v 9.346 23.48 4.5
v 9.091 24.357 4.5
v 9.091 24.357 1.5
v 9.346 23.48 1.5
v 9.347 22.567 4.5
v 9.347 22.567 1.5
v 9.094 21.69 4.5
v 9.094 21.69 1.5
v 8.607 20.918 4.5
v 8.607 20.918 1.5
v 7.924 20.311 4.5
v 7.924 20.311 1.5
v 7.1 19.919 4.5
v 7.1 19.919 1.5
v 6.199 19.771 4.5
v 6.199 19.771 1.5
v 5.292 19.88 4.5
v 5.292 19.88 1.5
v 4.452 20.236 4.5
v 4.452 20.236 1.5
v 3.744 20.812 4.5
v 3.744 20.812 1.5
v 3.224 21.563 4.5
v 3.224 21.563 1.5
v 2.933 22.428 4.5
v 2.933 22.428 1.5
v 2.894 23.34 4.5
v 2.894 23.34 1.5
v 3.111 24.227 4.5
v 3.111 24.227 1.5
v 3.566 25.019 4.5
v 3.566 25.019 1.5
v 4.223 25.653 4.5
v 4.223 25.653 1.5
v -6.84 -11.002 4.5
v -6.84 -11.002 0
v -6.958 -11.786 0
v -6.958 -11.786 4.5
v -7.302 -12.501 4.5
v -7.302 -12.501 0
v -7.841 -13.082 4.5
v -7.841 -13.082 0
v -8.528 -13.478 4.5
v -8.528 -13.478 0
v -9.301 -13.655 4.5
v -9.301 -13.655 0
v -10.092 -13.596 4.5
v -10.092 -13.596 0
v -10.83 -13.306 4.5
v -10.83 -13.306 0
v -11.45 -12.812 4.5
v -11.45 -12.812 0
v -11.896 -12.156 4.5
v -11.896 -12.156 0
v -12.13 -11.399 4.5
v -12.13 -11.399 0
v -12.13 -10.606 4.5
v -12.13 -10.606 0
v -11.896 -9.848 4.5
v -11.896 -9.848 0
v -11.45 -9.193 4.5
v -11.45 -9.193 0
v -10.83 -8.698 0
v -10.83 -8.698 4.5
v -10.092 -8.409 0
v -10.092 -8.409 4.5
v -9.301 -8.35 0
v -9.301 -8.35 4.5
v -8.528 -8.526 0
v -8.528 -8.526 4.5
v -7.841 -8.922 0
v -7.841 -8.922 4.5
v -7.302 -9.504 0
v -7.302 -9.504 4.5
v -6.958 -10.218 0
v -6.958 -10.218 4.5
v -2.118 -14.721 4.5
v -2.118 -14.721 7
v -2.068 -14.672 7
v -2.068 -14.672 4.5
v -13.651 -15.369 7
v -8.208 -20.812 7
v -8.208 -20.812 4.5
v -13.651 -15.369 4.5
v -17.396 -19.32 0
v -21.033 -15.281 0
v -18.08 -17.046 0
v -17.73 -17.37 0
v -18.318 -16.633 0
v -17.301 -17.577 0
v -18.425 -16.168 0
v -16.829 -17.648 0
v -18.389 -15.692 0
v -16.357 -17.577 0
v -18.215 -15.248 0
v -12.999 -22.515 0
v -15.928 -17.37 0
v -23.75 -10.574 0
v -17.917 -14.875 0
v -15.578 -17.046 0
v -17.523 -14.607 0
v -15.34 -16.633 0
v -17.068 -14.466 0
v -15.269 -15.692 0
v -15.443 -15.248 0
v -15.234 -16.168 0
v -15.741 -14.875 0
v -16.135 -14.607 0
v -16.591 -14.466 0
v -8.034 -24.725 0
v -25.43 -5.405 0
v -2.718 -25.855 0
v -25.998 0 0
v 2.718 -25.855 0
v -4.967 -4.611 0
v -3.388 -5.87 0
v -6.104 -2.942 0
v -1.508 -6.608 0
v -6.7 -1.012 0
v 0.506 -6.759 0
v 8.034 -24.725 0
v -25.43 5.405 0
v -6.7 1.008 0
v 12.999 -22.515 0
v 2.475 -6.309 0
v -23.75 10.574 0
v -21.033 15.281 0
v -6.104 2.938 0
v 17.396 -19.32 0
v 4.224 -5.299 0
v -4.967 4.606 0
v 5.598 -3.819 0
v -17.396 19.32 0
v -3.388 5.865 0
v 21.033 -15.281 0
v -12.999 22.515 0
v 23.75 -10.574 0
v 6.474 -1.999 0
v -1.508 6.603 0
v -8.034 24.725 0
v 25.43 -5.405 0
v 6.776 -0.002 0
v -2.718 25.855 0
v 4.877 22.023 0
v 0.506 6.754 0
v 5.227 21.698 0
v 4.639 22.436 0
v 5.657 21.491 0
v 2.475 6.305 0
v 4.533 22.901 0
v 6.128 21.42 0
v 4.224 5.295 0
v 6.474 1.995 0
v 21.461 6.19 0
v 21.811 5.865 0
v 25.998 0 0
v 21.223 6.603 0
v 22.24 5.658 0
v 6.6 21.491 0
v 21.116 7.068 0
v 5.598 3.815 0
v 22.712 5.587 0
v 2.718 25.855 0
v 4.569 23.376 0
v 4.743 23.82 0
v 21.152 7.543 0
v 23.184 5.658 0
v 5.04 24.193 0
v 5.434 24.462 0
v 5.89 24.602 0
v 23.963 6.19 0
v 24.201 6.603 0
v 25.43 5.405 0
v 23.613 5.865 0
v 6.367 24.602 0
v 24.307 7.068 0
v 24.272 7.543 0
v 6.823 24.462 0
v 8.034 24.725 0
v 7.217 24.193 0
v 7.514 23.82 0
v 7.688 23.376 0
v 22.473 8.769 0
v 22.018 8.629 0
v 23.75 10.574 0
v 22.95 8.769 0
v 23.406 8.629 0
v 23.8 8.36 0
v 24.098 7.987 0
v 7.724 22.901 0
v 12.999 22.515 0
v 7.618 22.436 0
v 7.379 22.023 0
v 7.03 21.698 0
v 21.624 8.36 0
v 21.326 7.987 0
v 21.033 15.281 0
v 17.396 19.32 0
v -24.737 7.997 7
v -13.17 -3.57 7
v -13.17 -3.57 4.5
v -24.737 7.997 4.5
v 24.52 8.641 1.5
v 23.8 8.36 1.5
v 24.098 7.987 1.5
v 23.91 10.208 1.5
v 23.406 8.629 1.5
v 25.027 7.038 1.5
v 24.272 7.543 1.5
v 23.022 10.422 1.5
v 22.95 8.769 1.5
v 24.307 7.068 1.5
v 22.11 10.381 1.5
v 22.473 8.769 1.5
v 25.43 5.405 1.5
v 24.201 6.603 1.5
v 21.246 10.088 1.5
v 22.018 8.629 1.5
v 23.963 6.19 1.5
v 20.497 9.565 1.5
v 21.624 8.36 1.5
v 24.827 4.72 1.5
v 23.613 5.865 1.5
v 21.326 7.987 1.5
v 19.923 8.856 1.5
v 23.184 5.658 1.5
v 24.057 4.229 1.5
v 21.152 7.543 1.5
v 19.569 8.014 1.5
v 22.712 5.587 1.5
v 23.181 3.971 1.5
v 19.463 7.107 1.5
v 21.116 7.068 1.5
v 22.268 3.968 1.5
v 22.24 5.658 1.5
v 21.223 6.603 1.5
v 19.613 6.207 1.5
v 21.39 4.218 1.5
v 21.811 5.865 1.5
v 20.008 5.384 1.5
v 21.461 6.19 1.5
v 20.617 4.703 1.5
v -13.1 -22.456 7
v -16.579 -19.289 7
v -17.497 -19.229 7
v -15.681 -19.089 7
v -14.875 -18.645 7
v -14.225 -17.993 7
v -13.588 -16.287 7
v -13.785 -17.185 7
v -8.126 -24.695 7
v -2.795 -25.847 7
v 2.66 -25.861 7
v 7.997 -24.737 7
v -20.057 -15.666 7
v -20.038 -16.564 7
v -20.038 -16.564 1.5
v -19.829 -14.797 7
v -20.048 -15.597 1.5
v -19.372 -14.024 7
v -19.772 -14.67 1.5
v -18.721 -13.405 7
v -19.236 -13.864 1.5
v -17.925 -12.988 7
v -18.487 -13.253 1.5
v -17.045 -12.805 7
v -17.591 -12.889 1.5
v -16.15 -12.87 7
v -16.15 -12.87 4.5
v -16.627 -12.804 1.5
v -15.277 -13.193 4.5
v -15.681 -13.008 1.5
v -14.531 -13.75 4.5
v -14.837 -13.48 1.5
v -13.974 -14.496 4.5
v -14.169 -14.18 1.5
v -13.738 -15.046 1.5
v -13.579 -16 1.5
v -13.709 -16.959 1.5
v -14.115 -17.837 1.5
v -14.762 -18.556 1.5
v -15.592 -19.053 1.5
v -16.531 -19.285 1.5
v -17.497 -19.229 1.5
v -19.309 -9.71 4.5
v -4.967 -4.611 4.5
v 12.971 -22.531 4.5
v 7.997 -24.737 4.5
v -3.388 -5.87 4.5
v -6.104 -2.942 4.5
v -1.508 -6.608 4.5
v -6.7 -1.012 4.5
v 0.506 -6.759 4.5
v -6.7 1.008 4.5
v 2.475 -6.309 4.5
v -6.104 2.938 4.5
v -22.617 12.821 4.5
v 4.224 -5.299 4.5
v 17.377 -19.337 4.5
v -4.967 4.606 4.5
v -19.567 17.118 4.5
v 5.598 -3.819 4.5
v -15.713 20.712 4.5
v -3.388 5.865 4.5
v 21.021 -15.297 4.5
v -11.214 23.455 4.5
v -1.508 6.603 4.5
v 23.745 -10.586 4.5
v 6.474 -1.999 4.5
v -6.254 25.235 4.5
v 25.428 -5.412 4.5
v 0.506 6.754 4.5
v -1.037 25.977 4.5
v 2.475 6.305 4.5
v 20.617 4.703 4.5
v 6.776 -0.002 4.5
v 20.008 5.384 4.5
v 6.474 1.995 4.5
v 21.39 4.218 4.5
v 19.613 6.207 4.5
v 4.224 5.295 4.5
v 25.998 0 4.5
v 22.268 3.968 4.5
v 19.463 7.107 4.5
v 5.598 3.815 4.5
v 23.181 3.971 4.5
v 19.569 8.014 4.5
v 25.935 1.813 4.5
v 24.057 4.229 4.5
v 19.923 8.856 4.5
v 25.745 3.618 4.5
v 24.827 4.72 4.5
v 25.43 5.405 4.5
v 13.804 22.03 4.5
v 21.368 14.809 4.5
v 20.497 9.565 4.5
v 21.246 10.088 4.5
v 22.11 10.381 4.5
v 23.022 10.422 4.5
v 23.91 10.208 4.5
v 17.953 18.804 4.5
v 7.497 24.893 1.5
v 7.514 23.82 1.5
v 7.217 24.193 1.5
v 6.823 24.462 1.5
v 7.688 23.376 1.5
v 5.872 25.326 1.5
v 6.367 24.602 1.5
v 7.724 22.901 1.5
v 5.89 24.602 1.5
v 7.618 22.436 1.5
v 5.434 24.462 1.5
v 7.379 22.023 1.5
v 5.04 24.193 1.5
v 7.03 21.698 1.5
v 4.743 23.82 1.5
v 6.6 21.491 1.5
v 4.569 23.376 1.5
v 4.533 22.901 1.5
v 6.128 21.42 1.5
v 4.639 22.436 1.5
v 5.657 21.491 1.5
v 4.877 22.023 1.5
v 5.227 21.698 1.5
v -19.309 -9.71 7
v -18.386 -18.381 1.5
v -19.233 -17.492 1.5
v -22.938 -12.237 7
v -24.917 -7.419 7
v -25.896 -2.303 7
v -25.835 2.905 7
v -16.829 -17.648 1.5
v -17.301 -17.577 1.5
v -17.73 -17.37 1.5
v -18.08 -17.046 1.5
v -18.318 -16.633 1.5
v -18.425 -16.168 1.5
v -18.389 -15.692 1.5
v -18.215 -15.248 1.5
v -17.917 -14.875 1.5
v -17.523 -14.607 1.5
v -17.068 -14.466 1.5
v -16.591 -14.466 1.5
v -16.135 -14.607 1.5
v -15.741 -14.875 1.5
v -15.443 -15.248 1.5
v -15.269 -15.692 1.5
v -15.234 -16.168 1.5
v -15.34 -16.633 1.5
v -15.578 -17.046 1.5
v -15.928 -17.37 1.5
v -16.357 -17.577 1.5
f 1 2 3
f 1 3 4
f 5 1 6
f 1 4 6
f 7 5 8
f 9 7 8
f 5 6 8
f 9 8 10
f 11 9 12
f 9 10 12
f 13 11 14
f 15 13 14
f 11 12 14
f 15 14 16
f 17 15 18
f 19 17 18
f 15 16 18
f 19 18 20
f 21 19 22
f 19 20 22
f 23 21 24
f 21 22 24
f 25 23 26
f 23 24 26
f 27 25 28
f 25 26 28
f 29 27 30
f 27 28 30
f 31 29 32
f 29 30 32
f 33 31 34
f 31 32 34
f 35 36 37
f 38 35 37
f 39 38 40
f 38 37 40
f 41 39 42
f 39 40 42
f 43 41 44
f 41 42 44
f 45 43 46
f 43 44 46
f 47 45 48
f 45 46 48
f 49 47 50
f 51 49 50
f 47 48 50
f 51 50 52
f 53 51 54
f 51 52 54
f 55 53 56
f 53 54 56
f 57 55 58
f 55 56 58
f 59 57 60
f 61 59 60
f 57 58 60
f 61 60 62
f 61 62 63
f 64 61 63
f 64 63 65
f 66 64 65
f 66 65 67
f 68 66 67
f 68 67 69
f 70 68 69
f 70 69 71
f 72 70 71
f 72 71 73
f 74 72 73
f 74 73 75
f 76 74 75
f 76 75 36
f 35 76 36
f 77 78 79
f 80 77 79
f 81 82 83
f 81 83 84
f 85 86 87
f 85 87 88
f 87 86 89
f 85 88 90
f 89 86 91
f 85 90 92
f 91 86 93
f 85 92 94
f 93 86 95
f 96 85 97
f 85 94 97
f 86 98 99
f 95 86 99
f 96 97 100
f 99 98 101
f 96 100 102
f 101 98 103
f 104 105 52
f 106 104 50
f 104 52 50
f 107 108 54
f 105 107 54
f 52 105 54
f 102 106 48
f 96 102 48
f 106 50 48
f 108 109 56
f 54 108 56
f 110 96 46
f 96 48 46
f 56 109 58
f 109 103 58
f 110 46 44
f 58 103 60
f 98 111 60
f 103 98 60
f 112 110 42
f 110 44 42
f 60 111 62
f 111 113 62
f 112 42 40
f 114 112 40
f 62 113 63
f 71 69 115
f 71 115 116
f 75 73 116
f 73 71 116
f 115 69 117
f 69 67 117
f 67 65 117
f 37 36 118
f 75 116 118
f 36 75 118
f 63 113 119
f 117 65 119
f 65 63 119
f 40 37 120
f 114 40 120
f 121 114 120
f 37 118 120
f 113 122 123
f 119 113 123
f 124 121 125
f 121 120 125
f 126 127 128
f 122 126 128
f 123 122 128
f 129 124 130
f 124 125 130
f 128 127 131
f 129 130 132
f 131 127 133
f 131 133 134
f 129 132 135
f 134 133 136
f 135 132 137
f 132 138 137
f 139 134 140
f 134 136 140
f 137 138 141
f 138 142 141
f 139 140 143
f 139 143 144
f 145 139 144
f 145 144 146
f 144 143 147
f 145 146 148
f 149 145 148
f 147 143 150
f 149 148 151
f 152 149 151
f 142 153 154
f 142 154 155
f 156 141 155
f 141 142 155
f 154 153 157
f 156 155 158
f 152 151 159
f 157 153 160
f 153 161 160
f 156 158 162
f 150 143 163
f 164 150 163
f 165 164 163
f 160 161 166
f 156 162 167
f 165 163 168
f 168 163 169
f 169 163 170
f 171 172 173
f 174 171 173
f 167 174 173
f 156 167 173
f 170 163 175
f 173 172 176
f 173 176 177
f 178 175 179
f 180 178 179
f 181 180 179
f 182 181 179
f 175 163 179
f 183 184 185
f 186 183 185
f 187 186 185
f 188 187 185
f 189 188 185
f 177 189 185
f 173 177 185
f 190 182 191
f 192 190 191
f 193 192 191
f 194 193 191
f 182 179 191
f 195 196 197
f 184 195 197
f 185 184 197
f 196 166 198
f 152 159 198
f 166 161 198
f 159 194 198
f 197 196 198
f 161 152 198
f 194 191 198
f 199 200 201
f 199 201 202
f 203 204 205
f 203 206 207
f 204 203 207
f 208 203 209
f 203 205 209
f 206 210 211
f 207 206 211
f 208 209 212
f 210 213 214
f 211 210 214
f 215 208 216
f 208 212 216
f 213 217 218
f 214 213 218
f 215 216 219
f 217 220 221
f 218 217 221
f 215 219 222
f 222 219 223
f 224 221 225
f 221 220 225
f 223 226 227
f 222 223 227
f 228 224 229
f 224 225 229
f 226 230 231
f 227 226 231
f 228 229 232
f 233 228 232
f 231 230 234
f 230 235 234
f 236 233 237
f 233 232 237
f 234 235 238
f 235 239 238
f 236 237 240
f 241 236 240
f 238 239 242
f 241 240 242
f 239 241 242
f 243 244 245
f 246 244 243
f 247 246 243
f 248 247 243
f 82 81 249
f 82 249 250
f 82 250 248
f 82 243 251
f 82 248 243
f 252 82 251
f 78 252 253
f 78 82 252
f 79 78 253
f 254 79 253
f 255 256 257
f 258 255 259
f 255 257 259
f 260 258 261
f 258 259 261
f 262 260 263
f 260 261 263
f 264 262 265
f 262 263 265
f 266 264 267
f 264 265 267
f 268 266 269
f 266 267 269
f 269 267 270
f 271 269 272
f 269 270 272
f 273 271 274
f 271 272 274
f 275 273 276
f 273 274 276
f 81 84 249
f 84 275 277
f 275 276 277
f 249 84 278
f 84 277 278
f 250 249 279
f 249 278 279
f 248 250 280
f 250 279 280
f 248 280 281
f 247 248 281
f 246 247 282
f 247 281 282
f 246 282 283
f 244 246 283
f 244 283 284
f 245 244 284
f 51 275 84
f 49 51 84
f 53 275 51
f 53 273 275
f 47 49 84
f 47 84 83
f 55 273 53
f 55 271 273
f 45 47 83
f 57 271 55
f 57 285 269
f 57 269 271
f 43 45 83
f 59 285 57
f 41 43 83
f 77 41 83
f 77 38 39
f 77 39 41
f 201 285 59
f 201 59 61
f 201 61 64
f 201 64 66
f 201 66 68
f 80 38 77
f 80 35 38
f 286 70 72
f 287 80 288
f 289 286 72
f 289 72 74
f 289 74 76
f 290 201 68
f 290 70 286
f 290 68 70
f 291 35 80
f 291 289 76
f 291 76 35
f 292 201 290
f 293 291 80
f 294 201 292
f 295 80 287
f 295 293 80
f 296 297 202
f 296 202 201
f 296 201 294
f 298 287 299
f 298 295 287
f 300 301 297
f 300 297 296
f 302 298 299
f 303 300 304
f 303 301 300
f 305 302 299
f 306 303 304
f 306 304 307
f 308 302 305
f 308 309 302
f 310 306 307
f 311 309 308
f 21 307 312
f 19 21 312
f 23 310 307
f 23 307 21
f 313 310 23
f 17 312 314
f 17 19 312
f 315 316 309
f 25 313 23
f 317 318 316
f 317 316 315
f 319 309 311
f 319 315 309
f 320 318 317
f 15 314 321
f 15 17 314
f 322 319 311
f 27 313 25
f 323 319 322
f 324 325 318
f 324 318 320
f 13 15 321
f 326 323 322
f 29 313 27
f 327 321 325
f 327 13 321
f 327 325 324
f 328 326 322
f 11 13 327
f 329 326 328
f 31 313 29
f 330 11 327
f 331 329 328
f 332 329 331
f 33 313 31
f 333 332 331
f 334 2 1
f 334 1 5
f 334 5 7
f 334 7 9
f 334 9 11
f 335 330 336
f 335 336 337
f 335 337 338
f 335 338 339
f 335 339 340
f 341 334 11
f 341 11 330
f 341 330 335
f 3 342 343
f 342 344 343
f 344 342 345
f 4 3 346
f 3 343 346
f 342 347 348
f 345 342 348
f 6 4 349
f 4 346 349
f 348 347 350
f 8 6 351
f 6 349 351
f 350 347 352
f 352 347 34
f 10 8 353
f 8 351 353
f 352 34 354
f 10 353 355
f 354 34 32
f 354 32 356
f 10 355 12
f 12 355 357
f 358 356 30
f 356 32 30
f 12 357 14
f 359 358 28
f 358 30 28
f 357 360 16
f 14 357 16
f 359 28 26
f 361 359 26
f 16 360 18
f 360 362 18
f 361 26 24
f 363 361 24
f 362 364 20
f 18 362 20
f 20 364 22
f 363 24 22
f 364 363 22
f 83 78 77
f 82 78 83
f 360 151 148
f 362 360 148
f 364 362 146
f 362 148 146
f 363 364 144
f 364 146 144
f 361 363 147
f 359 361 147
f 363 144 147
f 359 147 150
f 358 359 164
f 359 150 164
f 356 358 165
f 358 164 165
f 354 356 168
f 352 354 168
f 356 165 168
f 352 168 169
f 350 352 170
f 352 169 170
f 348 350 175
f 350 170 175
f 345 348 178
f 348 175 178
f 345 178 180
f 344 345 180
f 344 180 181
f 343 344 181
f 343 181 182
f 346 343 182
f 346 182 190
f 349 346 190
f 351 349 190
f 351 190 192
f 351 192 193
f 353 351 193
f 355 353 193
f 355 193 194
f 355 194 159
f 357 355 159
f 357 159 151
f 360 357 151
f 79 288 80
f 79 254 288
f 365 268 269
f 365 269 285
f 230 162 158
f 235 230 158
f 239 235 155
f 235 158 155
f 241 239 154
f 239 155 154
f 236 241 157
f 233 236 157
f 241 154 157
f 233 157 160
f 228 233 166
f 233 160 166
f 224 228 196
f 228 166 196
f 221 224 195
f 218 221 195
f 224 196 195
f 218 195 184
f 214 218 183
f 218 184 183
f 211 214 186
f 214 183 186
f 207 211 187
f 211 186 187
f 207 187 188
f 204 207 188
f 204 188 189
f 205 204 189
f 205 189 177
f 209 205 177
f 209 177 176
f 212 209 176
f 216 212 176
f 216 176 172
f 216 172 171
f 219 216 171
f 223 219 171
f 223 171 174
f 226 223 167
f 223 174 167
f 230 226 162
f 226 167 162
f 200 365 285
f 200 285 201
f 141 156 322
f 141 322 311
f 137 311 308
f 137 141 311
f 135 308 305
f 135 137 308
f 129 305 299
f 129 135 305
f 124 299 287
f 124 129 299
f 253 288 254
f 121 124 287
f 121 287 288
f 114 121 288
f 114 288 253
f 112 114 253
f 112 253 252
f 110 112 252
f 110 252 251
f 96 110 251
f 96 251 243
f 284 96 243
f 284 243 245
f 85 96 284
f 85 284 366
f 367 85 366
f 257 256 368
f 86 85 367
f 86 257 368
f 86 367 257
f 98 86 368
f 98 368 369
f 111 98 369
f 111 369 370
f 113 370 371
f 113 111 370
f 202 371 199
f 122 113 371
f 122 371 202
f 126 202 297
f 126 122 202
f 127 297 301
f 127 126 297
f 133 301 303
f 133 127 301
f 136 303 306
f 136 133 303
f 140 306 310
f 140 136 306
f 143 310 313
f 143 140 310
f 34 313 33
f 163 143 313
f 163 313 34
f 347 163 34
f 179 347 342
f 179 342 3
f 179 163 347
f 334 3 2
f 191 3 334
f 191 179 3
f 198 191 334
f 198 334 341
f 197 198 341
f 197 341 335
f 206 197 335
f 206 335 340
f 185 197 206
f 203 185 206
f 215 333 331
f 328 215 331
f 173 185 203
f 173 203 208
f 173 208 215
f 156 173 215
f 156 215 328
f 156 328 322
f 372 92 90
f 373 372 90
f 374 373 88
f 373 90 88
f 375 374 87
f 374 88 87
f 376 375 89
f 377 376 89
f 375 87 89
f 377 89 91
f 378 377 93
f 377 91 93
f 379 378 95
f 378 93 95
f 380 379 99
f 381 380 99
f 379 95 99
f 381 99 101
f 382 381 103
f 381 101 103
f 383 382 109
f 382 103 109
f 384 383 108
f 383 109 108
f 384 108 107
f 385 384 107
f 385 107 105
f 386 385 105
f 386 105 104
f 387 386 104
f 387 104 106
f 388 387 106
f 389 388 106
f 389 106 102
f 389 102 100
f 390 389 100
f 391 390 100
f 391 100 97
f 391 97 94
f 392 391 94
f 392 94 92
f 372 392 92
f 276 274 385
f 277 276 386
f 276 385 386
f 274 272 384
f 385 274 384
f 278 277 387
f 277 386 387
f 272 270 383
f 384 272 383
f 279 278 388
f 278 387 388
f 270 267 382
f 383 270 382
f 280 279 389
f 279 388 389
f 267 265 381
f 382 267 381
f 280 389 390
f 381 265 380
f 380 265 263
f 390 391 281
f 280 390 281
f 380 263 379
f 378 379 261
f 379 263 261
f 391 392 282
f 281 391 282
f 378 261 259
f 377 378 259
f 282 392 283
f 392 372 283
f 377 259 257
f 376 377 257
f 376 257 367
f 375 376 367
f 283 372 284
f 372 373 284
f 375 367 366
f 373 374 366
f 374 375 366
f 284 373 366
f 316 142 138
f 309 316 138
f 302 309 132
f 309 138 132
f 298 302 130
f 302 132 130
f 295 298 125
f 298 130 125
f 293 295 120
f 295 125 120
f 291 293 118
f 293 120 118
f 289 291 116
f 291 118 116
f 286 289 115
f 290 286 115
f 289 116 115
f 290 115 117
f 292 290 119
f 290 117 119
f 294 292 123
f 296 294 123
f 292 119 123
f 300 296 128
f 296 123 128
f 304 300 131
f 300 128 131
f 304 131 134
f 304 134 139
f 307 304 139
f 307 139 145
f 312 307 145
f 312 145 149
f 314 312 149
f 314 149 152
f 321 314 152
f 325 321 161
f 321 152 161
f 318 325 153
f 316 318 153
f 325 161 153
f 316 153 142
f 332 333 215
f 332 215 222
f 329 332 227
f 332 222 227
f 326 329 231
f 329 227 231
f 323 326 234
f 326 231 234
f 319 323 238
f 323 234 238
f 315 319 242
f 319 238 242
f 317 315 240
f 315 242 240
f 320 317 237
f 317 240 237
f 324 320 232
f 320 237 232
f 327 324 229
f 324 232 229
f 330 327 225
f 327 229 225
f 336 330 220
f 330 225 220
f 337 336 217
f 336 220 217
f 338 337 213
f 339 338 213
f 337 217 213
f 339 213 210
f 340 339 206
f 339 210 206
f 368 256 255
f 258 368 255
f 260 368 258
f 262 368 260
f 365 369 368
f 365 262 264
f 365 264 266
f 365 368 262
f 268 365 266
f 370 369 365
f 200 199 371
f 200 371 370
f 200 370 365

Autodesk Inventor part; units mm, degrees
ref_plane "YZ Plane" through (0, 0, 0) normal (1, 0, 0) x (0, 1, 0)
ref_plane "XZ Plane" through (0, 0, 0) normal (0, 1, 0) x (-1, 0, 0)
ref_plane "XY Plane" through (0, 0, 0) normal (0, 0, 1) x (1, 0, 0)
ref_plane "Work Plane1" through (0, 0, 0) normal (0, 0, 1) x (1, 0, 0)
sketch "Sketch1" plane through (0, 0, 0) normal (0, 0, 1) x (1, 0, 0)
  circle A0 centre (0, 0) radius 25.9979 projected
  circle A1 centre (-9.4998, -11.0022) radius 2.6601 projected
  circle A2 centre (0.0001, -0.0022) radius 3.8801 projected
  circle A3 centre (0.0001, -0.0022) radius 6.7754 projected
  point P0 (0, 0)
extrude "Extrusion1" add sketch "Sketch1" along normal blind 7 contours A0
sketch "Sketch2" plane through (0, 0, 7) normal (0, 0, 1) x (1, 0, 0)
  line L0 (-10.4551, 50.2837) -> (48.898, -9.0695)
  line L1 (48.898, -9.0695) -> (20.6137, -37.3537)
  line L2 (20.6137, -37.3537) -> (-38.7394, 21.9994)
  line L3 (-38.7394, 21.9994) -> (-10.4551, 50.2837)
  line L4 (-10.4551, 50.2837) -> (20.6137, -37.3537) construction
  line L5 (48.898, -9.0695) -> (-38.7394, 21.9994) construction
  line L6 (-10.4551, 50.2837) -> (73.4829, 50.2837) construction
  circle A0 centre (-9.4998, -11.0022) radius 2.6601 projected
  point P0 (5.0793, 6.465)
  dimension "d2" = 135
  dimension "d3" = 40
extrude "Extrusion2" cut sketch "Sketch2" against normal blind 2.5 contours L0 L1 L2 L3
sketch "Sketch3" plane through (0, 0, 7) normal (0, 0, 1) x (1, 0, 0)
  line L0 (-7.7936, -20.2561) -> (-2.9652, -15.4277) projected
  line L1 (-18.7537, -9.2959) -> (-13.9253, -4.4675) projected
  line L2 (-13.219, -3.6198) -> (-2.1175, -14.7214)
  line L3 (-2.1175, -14.7214) -> (-8.2078, -20.8117)
  line L4 (-8.2078, -20.8117) -> (-19.3094, -9.7102)
  line L5 (-19.3094, -9.7102) -> (-13.219, -3.6198)
  line L6 (-7.6188, -9.1212) -> (-24.7373, 7.9973) projected
  line L7 (-13.1696, -3.5704) -> (-2.1175, -14.7214)
  line L8 (-2.1175, -14.7214) -> (-0.0463, -12.6686)
  line L9 (-0.0463, -12.6686) -> (-11.0984, -1.5176)
  line L10 (-11.0984, -1.5176) -> (-13.1696, -3.5704)
  line L11 (-13.1696, -3.5704) -> (-13.219, -3.6198)
  line L12 (7.9973, -24.7373) -> (-24.7373, 7.9973) projected
  line L13 (-13.9253, -4.4675) -> (-2.9652, -15.4277) projected
  line L14 (-7.7936, -20.2561) -> (-18.7537, -9.2959) projected
  point P0 (0, 0)
  point P1 (-8.9176, -8.4066)
  point P2 (-24.7373, 7.9973)
  dimension "d6" = 0.1
extrude "Extrusion3" cut sketch "Sketch3" against normal up to surface (2.5 mm away) contours L14 L1 L13 L0 | L11 L7 L2 | L2 L3 L4 L5 | L7 L6 L12 L8 | L10 L9 L8 L12 L6
sketch "Skizze4" plane through (0, 0, 7) normal (0, 0, 1) x (1, 0, 0)
  spline S0 degree 2 poles (24.1427, 2.2394) (24.731, 1.8489) (25.3785, 0.5587) (25.3785, -0.3311) knots 0 0 0 1 2 2 2 construction
  spline S1 degree 2 poles (25.3785, -0.3311) (25.3785, -1.1665) (24.7013, -2.5111) (24.1328, -2.8867) knots 0 0 0 1 2 2 2 construction
  spline S2 degree 2 poles (24.1328, -2.8867) (23.6682, -3.1784) (22.7141, -3.3761) (21.9726, -3.3761) knots 0 0 0 1 2 2 2 construction
  line L0 (21.9726, -3.3761) -> (20.5687, -3.3761) construction
  line L1 (20.5687, -3.3761) -> (20.5687, 2.7239) construction
  line L2 (20.5687, 2.7239) -> (21.9578, 2.7239) construction
  spline S3 degree 2 poles (21.9578, 2.7239) (22.8179, 2.7239) (23.7967, 2.4668) (24.1427, 2.2394) knots 0 0 0 1 2 2 2 construction
  spline S4 degree 2 poles (19.1896, -2.9312) (18.8979, -3.1982) (18.1564, -3.4849) (17.5978, -3.4849) knots 0 0 0 1 2 2 2 construction
  spline S5 degree 2 poles (17.5978, -3.4849) (16.9354, -3.4849) (16.0061, -3.2081) (15.5958, -3.0103) knots 0 0 0 1 2 2 2 construction
  line L3 (15.5958, -3.0103) -> (15.5958, -1.992) construction
  line L4 (15.5958, -1.992) -> (15.6551, -1.992) construction
  spline S6 degree 2 poles (15.6551, -1.992) (16.0555, -2.3677) (17.0689, -2.7829) (17.5385, -2.7829) knots 0 0 0 1 2 2 2 construction
  spline S7 degree 2 poles (17.5385, -2.7829) (18.2108, -2.7829) (18.8979, -2.2243) (18.8979, -1.7646) knots 0 0 0 1 2 2 2 construction
  spline S8 degree 2 poles (18.8979, -1.7646) (18.8979, -1.3988) (18.5371, -0.944) (18.1465, -0.8303) knots 0 0 0 1 2 2 2 construction
  spline S9 degree 2 poles (18.1465, -0.8303) (17.8648, -0.7513) (17.3952, -0.6425) (17.0442, -0.5535) knots 0 0 0 1 2 2 2 construction
  spline S10 degree 2 poles (17.0442, -0.5535) (16.7278, -0.4695) (16.2285, -0.2174) (16.0358, -0.0147) knots 0 0 0 1 2 2 2 construction
  spline S11 degree 2 poles (16.0358, -0.0147) (15.8479, 0.188) (15.6403, 0.7317) (15.6403, 1.0876) knots 0 0 0 1 2 2 2 construction
  spline S12 degree 2 poles (15.6403, 1.0876) (15.6403, 1.8291) (16.797, 2.8326) (17.6918, 2.8326) knots 0 0 0 1 2 2 2 construction
  spline S13 degree 2 poles (17.6918, 2.8326) (18.2059, 2.8326) (19.1154, 2.6299) (19.5059, 2.4372) knots 0 0 0 1 2 2 2 construction
  line L5 (19.5059, 2.4372) -> (19.5059, 1.4683) construction
  line L6 (19.5059, 1.4683) -> (19.4466, 1.4683) construction
  spline S14 degree 2 poles (19.4466, 1.4683) (19.155, 1.7352) (18.2454, 2.1307) (17.7461, 2.1307) knots 0 0 0 1 2 2 2 construction
  spline S15 degree 2 poles (17.7461, 2.1307) (17.1826, 2.1307) (16.4856, 1.6017) (16.4856, 1.1717) knots 0 0 0 1 2 2 2 construction
  spline S16 degree 2 poles (16.4856, 1.1717) (16.4856, 0.7861) (16.8959, 0.3264) (17.2815, 0.2226) knots 0 0 0 1 2 2 2 construction
  spline S17 degree 2 poles (17.2815, 0.2226) (17.5385, 0.1534) (18.285, -0.0246) (18.5321, -0.0987) knots 0 0 0 1 2 2 2 construction
  spline S18 degree 2 poles (18.5321, -0.0987) (19.1599, -0.2915) (19.7432, -1.0676) (19.7432, -1.6361) knots 0 0 0 1 2 2 2 construction
  spline S19 degree 2 poles (19.7432, -1.6361) (19.7432, -1.997) (19.4516, -2.689) (19.1896, -2.9312) knots 0 0 0 1 2 2 2 construction
  circle A0 centre (-9.9998, 17.4978) radius 1.3999 construction
  circle A1 centre (10.0001, 17.4979) radius 1.4 construction
  circle A2 centre (10.0001, -17.5021) radius 1.4 construction
  circle A3 centre (-9.9998, -17.5021) radius 1.4001 construction
  arc A4 (-25.1198, 6.6998) -> (-24.1417, 5.4917) centre (-24.1417, 6.4917) ccw construction
  line L7 (-24.1417, 5.4917) -> (-17.7002, 5.4917) construction
  arc A5 (-15.7002, 3.4917) -> (-17.7002, 5.4917) centre (-17.7002, 3.4917) ccw construction
  line L8 (-15.7002, 3.4917) -> (-15.7002, -4.496) construction
  arc A6 (-17.7002, -6.496) -> (-15.7002, -4.496) centre (-17.7002, -4.496) ccw construction
  line L9 (-17.7002, -6.496) -> (-23.8502, -6.496) construction
  arc A7 (-23.8502, -6.496) -> (-24.8235, -7.7254) centre (-23.8502, -7.496) ccw construction
  arc A8 (-24.8235, -7.7254) -> (-25.1198, 6.6998) centre (0, 0) ccw construction
  circle A9 centre (-9.4998, -11.0022) radius 2.6601 construction
  circle A10 centre (-16.8291, -16.0482) radius 1.4 construction
  circle A11 centre (6.1284, 23.0202) radius 1.4 construction
  circle A12 centre (22.7119, 7.1872) radius 1.4 construction
  circle A13 centre (0.0001, -0.0022) radius 6.5 construction
  point P0 (0, 0)
hole "Bohrung1" at (6.1284, 23.0202, 7) at (22.7119, 7.1872, 7) at (-16.8291, -16.0482, 7) direction (0, 0, -1) diameter 3.2 end through all counterbore diameter 6.5 counterbore depth 5.5
sketch "Skizze5" plane through (0, 0, 4.5) normal (0, 0, 1) x (1, 0, 0)
  circle A0 centre (0.0001, -0.0022) radius 6.7754 projected
  circle A1 centre (3.9139, 5.5285) radius 18
  point P0 (0, 0)
  dimension "d16" = 36
properties part number "Matchboxscope_sample_universal"
